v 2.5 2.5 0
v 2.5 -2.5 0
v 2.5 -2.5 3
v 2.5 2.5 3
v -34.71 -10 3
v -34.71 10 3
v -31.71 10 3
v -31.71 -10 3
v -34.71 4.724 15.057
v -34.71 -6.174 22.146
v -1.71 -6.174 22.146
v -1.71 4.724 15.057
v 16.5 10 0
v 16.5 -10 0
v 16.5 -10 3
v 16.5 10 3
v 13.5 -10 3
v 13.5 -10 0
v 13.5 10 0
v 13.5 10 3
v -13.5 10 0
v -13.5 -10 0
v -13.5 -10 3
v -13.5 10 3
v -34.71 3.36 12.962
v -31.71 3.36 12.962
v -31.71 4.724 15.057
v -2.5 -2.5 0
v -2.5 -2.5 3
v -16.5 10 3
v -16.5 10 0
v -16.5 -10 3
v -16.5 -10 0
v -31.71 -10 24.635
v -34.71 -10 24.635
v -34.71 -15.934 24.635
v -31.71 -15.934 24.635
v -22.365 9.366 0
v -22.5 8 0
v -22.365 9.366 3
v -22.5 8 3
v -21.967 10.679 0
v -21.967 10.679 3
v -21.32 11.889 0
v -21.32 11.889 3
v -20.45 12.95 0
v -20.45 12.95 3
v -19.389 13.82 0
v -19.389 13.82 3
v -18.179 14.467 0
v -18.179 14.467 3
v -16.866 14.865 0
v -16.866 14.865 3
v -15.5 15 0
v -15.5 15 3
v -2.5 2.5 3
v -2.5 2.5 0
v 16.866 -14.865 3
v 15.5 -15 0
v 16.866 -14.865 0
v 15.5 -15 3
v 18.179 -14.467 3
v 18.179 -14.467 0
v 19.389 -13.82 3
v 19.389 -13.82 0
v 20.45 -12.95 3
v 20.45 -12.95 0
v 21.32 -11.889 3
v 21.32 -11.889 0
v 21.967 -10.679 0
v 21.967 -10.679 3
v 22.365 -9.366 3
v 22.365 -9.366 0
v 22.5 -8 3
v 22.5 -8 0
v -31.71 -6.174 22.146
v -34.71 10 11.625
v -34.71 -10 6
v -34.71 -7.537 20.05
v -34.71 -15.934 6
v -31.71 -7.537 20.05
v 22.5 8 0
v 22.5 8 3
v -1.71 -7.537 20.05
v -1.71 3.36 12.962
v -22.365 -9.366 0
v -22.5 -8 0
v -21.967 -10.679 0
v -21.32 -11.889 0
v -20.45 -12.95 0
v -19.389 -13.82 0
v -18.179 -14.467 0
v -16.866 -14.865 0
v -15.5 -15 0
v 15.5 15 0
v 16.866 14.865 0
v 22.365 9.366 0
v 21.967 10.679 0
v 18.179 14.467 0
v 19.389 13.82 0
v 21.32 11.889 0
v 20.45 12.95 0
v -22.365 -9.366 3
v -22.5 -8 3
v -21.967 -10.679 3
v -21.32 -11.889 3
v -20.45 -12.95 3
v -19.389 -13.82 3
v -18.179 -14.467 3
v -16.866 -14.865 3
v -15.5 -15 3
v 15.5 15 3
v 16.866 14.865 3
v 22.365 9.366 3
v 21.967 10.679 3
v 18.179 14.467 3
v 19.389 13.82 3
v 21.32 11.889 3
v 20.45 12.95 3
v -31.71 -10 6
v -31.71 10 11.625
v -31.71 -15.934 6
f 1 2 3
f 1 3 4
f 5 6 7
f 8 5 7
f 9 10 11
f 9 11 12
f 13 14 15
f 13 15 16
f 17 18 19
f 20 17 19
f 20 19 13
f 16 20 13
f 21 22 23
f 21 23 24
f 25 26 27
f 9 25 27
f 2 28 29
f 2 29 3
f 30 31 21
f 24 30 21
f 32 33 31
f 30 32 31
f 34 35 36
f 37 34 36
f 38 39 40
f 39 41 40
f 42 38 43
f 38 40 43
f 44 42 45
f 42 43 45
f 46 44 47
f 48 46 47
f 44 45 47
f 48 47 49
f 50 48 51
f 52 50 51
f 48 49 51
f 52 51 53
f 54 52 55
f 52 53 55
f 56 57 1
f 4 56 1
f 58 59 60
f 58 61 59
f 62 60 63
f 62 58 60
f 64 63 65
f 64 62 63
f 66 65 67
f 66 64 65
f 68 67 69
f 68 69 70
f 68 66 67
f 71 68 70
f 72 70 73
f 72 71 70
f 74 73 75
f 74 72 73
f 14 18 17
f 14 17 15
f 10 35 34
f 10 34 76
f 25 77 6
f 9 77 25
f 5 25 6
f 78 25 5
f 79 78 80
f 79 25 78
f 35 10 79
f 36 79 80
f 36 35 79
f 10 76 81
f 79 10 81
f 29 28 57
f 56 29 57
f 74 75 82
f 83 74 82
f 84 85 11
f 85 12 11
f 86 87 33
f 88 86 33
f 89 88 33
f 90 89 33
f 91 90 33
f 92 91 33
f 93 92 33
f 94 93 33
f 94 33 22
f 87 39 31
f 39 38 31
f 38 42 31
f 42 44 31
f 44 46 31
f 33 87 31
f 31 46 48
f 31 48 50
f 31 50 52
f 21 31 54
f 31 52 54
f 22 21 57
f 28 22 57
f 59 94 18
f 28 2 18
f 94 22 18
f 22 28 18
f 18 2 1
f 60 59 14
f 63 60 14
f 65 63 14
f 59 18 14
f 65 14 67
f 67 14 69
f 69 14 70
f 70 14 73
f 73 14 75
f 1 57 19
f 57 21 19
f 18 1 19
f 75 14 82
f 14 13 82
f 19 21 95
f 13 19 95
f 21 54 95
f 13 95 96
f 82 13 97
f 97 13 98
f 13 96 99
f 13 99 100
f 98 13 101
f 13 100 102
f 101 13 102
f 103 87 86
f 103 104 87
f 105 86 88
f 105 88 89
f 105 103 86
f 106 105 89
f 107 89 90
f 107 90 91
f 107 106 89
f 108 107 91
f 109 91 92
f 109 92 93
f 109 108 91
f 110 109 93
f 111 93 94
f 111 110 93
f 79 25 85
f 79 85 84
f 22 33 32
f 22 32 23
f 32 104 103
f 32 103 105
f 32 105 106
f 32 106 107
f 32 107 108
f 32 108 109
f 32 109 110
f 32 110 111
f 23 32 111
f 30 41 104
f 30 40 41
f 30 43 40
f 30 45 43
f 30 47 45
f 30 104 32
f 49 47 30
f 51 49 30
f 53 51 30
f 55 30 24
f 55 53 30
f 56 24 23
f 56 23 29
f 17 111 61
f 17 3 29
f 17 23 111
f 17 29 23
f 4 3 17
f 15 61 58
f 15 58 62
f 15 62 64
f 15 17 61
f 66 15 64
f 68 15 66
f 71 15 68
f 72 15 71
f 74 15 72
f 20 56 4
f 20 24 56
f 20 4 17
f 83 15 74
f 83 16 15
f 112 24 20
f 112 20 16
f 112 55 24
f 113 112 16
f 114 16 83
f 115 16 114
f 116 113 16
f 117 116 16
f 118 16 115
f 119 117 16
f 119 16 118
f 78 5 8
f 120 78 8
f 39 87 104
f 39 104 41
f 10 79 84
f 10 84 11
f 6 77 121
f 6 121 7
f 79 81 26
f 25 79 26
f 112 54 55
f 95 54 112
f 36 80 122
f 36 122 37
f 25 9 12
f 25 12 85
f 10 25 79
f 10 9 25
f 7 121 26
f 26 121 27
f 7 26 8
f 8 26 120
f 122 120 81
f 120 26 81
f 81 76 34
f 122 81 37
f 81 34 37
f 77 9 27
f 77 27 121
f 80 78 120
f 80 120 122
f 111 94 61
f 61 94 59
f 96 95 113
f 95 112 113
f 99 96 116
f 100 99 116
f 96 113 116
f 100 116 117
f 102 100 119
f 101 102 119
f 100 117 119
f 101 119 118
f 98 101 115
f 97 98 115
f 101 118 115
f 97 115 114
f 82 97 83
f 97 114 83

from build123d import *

# Parameters (mm, degrees)
F0_W      = 45
F0_H      = 30
F0_W_2    = 3
F0_H_2    = 20
F0_W_3    = 5
F0_H_3    = 5
F1_DEPTH  = 3
F2_R      = 7
F3_W      = 3
F3_H      = 20
F4_DEPTH  = 3
F5_W      = 5.9335825592
F5_H      = 18.6349982917
F6_DEPTH  = 3
F8_DEPTH  = 25
F10_DEPTH = 33


with BuildPart() as f1:
    # F0 (on Top) → F1 (new body)
    with BuildSketch(Plane.XY):
        Rectangle(F0_W, F0_H)
        with Locations((-15, 0)):
            Rectangle(F0_W_2, F0_H_2, mode=Mode.SUBTRACT)
        Rectangle(F0_W_3, F0_H_3, mode=Mode.SUBTRACT)
        with Locations((15, 0)):
            Rectangle(F0_W_2, F0_H_2, mode=Mode.SUBTRACT)
    extrude(amount=F1_DEPTH)

    # F2
    f2_edges = [f1.edges().sort_by_distance(p)[0] for p in [
        (-22.5, 15, 1.5),
        (-22.5, -15, 1.5),
        (22.5, -15, 1.5),
        (22.5, 15, 1.5),
    ]]
    fillet(f2_edges, radius=F2_R)


with BuildPart() as f4:
    # F3 (on face) → F4 (new body)
    with BuildSketch(Plane.XY.offset(3)):
        with Locations((-33.210418433, 0)):
            Rectangle(F3_W, F3_H)
    extrude(amount=F4_DEPTH)

    # F5 (on face) → F6 (join)
    with BuildSketch(Plane(origin=(-34.710418433, 0, 0), x_dir=(0, -1, 0), z_dir=(-1, 0, 0))):
        with Locations((12.9667912796, 15.3174991459)):
            Rectangle(F5_W, F5_H)
        Polygon((10, 6), (10, 24.6349982917), (-10, 11.6250403225), (-10, 6), align=None)
    extrude(amount=-F6_DEPTH)

    # F7 (on face) → F8 (cut)
    with BuildSketch(Plane.YZ.offset(-31.710418433)):
        Polygon((4.7235328902, 15.0573710887), (-6.1737542047, 22.1460334429), (-7.5369585036, 20.0504013093), (3.3603285913, 12.9617389551), align=None)
    extrude(amount=-F8_DEPTH, mode=Mode.SUBTRACT)


with BuildPart() as f10:
    # F9 (on face) → F10 (new body)
    with BuildSketch(Plane(origin=(-34.710418433, 0, 0), x_dir=(0, -1, 0), z_dir=(-1, 0, 0))):
        Polygon((-3.3603285913, 12.9617389551), (7.5369585036, 20.0504013093), (6.1737542047, 22.1460334429), (-4.7235328902, 15.0573710887), align=None)
    extrude(amount=-F10_DEPTH)


solid = Compound([f1.part, f4.part, f10.part])
